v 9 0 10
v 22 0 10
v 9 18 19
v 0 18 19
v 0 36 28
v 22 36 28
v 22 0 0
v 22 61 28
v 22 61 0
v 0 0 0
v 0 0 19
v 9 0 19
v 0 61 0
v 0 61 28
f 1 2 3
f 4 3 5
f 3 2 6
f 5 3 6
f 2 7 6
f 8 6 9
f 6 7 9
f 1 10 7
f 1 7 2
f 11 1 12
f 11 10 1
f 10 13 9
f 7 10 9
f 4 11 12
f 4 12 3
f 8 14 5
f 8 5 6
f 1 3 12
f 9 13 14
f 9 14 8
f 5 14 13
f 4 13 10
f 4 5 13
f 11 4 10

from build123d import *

# Parameters (mm, degrees)
F0_W     = 22
F0_H     = 61
F1_DEPTH = 28
F3_DEPTH = 22.001
F5_DEPTH = 9


with BuildPart() as f1:
    # F0 (on Top) → F1 (new body)
    with BuildSketch(Plane.XY):
        with Locations((11, 30.5)):
            Rectangle(F0_W, F0_H)
    extrude(amount=F1_DEPTH)

    # F2 (on face) → F3 (cut, through all)
    with BuildSketch(Plane.YZ.offset(22)):
        Polygon((36, 28), (0, 28), (0, 10), align=None)
    extrude(amount=-F3_DEPTH, mode=Mode.SUBTRACT)

    # F4 (on face) → F5 (join)
    with BuildSketch(Plane(origin=(0, 0, 0), x_dir=(0, -1, 0), z_dir=(-1, 0, 0))):
        Polygon((-18, 19), (0, 10), (0, 19), align=None)
    extrude(amount=-F5_DEPTH)


solid = f1.part
